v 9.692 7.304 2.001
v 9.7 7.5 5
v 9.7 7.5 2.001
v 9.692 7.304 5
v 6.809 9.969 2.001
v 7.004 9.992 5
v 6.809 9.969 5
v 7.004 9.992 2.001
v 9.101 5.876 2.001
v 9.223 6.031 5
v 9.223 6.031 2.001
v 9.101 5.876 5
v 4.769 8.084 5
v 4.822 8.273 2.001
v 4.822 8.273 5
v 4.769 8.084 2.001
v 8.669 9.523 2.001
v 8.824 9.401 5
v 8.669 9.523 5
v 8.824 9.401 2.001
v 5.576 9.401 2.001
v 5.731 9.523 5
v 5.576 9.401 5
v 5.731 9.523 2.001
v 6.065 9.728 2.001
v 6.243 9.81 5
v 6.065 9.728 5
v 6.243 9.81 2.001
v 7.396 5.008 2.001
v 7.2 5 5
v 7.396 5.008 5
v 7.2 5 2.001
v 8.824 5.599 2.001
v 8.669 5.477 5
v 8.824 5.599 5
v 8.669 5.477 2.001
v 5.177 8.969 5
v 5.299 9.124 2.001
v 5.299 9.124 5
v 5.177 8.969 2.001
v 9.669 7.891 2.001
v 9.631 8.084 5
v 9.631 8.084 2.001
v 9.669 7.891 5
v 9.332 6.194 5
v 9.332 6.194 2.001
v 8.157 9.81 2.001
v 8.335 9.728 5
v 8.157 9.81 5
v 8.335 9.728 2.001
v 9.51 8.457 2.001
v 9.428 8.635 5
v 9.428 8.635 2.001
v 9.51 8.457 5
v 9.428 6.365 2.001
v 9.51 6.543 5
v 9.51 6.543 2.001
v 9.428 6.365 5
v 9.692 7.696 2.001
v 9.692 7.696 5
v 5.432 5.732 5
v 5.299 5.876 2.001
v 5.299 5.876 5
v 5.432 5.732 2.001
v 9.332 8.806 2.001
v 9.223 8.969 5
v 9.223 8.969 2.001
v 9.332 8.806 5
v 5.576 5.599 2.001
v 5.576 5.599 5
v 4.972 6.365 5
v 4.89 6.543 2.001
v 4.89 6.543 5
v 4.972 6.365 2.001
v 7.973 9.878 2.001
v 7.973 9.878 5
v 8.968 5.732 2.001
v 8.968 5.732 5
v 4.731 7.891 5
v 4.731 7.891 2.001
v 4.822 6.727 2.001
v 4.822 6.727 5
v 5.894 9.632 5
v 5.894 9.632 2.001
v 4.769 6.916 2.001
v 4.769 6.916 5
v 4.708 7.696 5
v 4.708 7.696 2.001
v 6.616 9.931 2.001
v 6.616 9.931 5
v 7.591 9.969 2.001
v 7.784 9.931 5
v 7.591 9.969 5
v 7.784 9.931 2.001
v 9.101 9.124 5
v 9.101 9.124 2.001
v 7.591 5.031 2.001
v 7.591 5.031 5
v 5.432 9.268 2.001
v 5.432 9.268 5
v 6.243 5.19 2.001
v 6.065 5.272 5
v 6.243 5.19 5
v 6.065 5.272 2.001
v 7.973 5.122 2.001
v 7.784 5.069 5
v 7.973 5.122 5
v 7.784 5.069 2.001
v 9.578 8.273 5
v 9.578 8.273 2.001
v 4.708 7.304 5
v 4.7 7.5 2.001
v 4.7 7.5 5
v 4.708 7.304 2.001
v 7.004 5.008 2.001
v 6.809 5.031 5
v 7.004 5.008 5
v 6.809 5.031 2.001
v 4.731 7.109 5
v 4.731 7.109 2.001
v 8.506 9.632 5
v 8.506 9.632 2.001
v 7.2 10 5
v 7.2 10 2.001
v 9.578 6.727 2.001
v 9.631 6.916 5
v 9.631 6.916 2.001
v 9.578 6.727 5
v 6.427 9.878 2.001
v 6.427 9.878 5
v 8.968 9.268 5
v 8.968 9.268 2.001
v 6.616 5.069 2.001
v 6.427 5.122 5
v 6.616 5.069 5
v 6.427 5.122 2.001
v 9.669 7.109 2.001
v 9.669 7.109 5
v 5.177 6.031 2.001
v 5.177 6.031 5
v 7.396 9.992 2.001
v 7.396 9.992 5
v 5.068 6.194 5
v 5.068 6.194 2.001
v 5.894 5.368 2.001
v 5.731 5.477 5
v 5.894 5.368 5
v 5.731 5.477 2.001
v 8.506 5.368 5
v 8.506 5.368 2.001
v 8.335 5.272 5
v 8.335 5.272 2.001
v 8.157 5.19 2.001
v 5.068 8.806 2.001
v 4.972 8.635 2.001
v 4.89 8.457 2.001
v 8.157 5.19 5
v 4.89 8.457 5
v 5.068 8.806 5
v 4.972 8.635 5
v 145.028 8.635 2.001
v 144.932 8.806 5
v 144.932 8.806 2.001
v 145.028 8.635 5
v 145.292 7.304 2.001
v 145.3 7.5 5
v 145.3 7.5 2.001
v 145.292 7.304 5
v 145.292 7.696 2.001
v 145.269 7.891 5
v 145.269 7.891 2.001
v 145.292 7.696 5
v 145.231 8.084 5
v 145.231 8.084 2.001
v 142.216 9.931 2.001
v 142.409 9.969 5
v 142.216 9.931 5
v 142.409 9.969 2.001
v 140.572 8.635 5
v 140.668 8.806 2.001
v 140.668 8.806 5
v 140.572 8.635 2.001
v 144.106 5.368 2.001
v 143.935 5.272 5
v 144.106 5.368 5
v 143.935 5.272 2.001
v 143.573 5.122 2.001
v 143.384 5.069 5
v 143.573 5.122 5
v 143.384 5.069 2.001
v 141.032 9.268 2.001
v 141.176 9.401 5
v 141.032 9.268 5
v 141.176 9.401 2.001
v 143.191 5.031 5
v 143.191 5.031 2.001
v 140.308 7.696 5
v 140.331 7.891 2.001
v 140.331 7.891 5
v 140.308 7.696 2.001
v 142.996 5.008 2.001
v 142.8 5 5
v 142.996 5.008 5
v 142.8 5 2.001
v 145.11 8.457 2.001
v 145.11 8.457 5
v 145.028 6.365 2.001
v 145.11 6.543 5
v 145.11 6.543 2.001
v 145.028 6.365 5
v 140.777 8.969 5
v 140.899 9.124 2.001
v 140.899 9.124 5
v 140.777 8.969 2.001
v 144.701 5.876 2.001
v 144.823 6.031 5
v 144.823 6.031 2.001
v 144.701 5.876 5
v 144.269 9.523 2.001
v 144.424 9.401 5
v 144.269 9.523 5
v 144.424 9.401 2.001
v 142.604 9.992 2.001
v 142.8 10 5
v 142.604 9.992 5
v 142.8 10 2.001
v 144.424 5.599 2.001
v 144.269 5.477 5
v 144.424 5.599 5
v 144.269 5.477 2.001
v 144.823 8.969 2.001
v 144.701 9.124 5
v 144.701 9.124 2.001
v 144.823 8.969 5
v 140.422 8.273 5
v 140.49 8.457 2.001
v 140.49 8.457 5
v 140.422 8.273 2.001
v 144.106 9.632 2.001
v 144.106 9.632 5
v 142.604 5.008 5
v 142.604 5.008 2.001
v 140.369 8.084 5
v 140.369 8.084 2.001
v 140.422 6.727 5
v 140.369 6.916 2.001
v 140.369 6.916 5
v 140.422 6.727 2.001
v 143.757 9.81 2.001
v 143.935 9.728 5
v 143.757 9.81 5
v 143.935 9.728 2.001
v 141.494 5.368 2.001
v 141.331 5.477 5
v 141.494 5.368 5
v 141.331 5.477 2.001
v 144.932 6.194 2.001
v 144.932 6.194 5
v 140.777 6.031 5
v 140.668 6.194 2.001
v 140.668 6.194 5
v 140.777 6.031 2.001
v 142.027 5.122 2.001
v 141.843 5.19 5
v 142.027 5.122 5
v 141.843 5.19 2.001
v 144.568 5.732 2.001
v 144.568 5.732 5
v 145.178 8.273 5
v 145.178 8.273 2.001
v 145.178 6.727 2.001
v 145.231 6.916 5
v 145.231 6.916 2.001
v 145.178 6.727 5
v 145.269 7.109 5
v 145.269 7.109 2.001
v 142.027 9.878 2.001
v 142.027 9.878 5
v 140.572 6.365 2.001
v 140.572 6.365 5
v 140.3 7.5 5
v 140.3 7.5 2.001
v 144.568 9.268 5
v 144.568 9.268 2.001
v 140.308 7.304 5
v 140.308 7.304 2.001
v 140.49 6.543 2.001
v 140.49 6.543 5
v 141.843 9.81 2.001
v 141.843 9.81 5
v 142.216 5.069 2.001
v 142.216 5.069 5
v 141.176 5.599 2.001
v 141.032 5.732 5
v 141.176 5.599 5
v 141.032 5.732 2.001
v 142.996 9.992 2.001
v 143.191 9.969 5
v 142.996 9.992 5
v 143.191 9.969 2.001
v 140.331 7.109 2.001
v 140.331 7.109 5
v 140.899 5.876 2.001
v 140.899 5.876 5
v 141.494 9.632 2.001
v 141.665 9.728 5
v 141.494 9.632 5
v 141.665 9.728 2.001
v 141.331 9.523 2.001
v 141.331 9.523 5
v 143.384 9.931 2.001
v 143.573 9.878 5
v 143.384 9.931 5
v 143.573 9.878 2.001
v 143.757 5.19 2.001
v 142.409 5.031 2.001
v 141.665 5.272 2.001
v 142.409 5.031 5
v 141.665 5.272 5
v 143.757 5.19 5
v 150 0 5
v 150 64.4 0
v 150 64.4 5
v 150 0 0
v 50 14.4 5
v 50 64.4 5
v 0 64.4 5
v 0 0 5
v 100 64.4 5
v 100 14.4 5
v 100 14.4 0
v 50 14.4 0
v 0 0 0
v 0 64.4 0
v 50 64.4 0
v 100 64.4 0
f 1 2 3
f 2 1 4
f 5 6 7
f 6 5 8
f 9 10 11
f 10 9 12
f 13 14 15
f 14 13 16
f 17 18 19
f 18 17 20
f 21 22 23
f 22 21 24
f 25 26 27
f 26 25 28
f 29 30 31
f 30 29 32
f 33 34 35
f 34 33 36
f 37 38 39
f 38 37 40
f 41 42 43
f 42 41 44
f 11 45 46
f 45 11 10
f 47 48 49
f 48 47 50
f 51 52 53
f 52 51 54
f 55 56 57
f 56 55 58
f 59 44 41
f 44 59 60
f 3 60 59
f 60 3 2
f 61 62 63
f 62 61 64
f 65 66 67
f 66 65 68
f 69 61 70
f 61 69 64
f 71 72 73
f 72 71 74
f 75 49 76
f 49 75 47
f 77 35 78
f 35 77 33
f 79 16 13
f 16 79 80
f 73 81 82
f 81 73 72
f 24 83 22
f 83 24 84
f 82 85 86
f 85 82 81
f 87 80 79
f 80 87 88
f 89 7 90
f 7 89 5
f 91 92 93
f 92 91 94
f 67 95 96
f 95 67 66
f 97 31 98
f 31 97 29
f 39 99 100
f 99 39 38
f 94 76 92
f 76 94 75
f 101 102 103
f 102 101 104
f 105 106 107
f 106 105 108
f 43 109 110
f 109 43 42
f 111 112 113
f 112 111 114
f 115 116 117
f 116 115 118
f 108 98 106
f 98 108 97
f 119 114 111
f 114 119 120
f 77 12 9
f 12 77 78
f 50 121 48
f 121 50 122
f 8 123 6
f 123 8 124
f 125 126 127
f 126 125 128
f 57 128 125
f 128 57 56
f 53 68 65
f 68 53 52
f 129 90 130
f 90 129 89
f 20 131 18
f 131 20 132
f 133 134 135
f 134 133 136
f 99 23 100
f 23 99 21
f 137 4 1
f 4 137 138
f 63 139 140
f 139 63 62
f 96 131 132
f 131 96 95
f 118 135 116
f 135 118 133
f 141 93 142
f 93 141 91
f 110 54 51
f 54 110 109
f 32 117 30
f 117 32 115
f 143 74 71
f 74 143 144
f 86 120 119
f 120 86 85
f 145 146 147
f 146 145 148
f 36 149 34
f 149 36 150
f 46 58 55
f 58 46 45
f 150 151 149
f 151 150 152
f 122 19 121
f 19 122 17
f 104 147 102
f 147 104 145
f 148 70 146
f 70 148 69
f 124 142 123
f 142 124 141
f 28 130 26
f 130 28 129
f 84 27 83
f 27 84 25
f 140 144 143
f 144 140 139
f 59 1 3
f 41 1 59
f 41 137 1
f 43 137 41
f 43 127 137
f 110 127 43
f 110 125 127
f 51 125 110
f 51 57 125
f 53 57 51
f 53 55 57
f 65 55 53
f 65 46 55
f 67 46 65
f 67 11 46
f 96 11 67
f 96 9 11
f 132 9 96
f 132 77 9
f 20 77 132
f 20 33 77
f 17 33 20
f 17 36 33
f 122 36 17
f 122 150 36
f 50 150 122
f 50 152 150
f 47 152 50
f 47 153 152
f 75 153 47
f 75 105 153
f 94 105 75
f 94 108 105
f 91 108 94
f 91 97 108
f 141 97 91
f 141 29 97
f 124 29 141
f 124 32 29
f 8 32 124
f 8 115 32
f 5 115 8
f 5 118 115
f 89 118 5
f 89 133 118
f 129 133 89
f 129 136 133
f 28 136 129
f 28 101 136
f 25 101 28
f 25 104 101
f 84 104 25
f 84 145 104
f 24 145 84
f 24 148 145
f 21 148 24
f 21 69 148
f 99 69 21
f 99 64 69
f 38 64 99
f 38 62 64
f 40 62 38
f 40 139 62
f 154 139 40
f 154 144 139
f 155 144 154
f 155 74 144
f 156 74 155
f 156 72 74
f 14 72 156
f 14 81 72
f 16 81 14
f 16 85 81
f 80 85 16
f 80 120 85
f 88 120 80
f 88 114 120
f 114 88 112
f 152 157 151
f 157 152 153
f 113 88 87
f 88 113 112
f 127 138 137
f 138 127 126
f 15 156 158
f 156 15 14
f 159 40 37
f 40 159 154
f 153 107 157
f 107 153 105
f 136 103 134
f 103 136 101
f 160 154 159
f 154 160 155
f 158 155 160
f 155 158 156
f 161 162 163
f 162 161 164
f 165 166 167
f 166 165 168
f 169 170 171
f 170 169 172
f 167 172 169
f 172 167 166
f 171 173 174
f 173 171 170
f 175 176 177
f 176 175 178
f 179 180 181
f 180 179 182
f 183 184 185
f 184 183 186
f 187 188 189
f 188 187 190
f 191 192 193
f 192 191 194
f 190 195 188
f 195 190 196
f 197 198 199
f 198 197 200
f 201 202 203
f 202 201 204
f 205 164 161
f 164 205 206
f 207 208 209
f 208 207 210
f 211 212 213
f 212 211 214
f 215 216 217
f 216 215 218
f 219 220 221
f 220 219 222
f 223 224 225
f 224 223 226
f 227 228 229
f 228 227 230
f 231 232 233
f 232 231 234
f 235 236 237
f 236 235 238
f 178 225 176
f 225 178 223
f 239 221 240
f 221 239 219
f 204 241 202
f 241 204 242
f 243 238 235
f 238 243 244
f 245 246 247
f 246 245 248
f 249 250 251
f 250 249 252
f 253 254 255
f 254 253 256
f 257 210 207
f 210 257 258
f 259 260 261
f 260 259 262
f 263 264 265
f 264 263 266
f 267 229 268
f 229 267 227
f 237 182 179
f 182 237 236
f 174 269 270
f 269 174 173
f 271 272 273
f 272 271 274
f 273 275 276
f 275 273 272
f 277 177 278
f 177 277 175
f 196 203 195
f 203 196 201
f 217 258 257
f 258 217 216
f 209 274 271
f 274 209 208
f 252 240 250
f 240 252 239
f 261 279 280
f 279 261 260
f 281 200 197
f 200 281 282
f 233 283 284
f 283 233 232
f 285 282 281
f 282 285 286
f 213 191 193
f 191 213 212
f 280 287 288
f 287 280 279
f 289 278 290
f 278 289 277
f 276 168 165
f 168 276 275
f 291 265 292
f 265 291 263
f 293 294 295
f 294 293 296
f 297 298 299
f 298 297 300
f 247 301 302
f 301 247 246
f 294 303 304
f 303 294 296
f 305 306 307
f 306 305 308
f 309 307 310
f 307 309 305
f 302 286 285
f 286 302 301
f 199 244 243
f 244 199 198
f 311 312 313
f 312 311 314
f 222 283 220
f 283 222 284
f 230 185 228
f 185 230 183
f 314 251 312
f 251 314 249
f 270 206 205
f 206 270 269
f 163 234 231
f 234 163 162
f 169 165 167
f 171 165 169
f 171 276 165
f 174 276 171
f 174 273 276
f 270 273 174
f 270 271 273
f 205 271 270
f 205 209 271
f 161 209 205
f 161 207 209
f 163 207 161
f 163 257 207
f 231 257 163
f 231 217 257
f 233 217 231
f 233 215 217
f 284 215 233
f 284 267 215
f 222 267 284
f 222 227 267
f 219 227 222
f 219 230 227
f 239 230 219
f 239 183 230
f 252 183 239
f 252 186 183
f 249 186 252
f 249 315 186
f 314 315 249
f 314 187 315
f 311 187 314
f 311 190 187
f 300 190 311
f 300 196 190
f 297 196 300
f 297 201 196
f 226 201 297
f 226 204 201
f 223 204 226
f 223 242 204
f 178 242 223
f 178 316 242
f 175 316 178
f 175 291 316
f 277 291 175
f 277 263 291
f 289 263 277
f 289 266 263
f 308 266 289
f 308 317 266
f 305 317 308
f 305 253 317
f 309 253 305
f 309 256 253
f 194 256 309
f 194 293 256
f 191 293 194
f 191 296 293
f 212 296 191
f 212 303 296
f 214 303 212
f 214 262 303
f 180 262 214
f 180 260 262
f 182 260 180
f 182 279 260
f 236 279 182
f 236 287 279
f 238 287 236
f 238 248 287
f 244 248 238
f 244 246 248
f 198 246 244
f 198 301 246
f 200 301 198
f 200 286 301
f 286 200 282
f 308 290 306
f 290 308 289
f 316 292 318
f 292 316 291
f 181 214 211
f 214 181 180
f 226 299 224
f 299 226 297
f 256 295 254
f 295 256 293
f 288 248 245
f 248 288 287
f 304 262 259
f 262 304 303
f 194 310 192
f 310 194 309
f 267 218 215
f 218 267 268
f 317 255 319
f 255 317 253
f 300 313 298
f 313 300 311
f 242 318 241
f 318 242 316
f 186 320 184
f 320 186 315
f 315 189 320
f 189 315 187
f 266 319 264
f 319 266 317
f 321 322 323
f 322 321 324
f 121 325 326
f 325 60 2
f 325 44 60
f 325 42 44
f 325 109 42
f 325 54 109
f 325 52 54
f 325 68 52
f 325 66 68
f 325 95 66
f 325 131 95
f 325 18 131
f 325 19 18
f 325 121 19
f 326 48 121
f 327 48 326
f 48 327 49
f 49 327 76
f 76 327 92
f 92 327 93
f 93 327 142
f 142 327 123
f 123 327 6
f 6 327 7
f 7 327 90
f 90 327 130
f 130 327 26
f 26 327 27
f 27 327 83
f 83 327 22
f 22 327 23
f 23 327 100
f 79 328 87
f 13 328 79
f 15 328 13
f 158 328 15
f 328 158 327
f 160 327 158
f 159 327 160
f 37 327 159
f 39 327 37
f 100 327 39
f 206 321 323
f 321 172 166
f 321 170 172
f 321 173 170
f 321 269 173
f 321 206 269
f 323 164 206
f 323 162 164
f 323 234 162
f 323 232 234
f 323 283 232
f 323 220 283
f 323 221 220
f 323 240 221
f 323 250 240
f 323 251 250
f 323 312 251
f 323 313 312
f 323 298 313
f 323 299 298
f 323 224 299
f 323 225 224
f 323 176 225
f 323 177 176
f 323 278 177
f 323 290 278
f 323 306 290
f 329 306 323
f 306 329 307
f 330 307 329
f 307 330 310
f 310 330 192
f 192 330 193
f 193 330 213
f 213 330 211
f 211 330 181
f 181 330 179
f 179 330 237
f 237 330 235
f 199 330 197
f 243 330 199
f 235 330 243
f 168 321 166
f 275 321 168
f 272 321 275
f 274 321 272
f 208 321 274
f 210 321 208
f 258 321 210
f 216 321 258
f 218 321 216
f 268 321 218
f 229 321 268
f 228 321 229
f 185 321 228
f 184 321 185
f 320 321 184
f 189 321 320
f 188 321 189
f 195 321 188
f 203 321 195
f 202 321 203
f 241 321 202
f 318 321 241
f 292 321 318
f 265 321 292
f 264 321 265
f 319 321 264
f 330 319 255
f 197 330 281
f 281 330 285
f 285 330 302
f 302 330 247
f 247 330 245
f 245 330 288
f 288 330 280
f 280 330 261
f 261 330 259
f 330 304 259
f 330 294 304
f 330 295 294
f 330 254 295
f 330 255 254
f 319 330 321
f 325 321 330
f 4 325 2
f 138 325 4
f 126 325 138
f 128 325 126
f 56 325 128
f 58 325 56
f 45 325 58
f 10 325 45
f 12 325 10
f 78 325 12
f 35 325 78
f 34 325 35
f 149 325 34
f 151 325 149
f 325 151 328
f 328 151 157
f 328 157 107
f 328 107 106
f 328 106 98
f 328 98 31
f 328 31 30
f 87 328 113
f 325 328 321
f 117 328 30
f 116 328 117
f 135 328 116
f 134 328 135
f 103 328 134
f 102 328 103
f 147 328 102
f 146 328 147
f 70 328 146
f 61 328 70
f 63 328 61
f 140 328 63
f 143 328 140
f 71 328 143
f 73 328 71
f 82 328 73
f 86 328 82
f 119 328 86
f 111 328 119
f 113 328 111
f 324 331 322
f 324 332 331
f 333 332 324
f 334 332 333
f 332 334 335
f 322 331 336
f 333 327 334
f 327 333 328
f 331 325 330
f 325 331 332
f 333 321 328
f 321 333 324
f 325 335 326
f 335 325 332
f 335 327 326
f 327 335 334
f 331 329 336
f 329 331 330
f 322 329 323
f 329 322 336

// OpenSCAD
// file: Modules.scad
/*
 * Jig to hold a model airplane while working on it.
 *
 * Vertical sections slide horizonally. Horizontal dimensions are scalable
 * by adding one or more extension bars.
 *
 * Wing supports clamp magnetically. Be sure to glue some felt on the
 * insides of the wing supports to protect the model
 *
 * ©Louis Kowolowski 2020
 */

module tail_holder () {
	translate ([3*bar_w, 0, 10]) {
		rotate ([0, 180, 0]) {
			tail_holder_bottom ();
		}
	}
	// height is +5 (thickness of top) because its been flipped over
	translate ([0, 0, -7]) {
		tail_holder_top ();
	}
}

module tail_holder_bottom () {
	difference () {
		cube ([3*bar_w, 1.5*bar_screw_head_d, bar_w/4]);

		union () {
			// screw/nut hole
			translate ([1.5*bar_w, 1.5*bar_screw_head_d+0.001, bar_w/8]) {
				rotate ([90, 0, 0]) {
					bar_screw ();
				}
			}
			// left magnet hole
			translate ([0.75*bar_screw_head_d, 1.5*bar_screw_d, bar_w/4-magnet_h+0.001]) {
				cylinder (magnet_h, d=magnet_d, $fn=80);
			}
			// right magnet hole
			translate ([(3*bar_w)-(0.75*bar_screw_head_d), 1.5*bar_screw_d, bar_w/4-magnet_h+0.001]) {
				cylinder (magnet_h, d=magnet_d, $fn=80);
			}
		}
	}
	// left side
	translate ([0, 1.5*bar_screw_head_d, 0]) {
		cube ([bar_w, bar_w, 5]);
	}

	// right side
	translate ([2*bar_w, 1.5*bar_screw_head_d, 0]) {
		cube ([bar_w, bar_w, 5]);
	}

}

module tail_holder_top () {

	difference () {
		cube ([3*bar_w, 1.5*bar_screw_head_d, 5]);
		union () {
			// left magnet hole
			translate ([0.75*bar_screw_head_d, 1.5*bar_screw_d, 5.001-magnet_h]) {
				cylinder (magnet_h, d=magnet_d, $fn=80);
			}
			// right magnet hole
			translate ([(3*bar_w)-(0.75*bar_screw_head_d), 1.5*bar_screw_d, 5.001-magnet_h]) {
				cylinder (magnet_h, d=magnet_d, $fn=80);
			}
		}
	}
	// left side
	translate ([0, 1.5*bar_screw_head_d, 0]) {
		cube ([bar_w, bar_w, 5]);
	}

	// right side
	translate ([2*bar_w, 1.5*bar_screw_head_d, 0]) {
		cube ([bar_w, bar_w, 5]);
	}
}

module nose_holder () {
	difference () {
		union () {
			cube ([bar_w, bar_w, 6]);
			translate ([0, 0, 6]) {
				// rear block to house screw/nut holder and magnets for top
				cube ([bar_screw_head_d, bar_w, 1.5*bar_screw_head_d]);
			}
			translate ([0, 0, 6]) {
				// rear block to house screw/nut holder and magnets for top
				cube ([bar_w, bar_w, 1.5*bar_screw_head_d]);
			}
		}
		union () {
			// screw/nut hole
			translate ([bar_screw_head_d+1, bar_w/2, 10]) {
				rotate ([0, 270, 0]) {
					bar_screw ();
				}
			}
			// angled cut to hold nose centered in jib
			translate ([bar_w/2+.5*bar_screw_head_d+0.001, bar_w/2, bar_w/2-5]) {
				rotate ([270, 210, 90]) {
					Triangle(a=bar_w, b=bar_w, angle=120, height=bar_w-bar_screw_head_d+0.001, centerXYZ=[true,true,true]);
				}
			}
			
		}
	}
}


module wing_holder () {
	wing_holder_bottom ();

	translate ([0, 0, 1.5*bar_screw_head_d+2]) {
		wing_holder_top ();
	}
}

module wing_holder_bottom () {
	// slides up and down the riser to hold the wing at the correct height
	difference () {
		union () {
			cube ([bar_w, bar_w, 6]);
			translate ([0, 0, 6]) {
				// rear block to house screw/nut holder and magnets for top
				// add 1 to height for room above the nut
				cube ([bar_screw_head_d, bar_w, bar_screw_head_d+1]);
			}
		}
		union () {
			// screw/nut hole
			translate ([bar_screw_head_d+1, bar_w/2, 11]) {
				rotate ([0, 270, 0]) {
					bar_screw ();
				}
			}
			// magnet mounting holes
			translate ([magnet_d/2+2, magnet_d, bar_screw_head_d+4.001]) {
				rotate ([0, 0, 90]) {
					cylinder (magnet_h, d=magnet_d, $fn=80);
				}
			}
			// magnet mounting holes
			translate ([magnet_d/2+2, bar_w-magnet_d, bar_screw_head_d+4.001]) {
				rotate ([0, 0, 90]) {
					cylinder (magnet_h, d=magnet_d, $fn=80);
				}
			}
		}
	}
}

module wing_holder_top () {
	difference () {
		cube ([bar_w, bar_w, 6]);
		union () {
			// magnet mounting holes
			translate ([bar_w-magnet_d, magnet_d, -1*0.001]) {
				rotate ([0, 0, 90]) {
					cylinder (magnet_h, d=magnet_d, $fn=80);
				}
			}
			// magnet mounting holes
			translate ([bar_w-magnet_d, bar_w-magnet_d, -1*0.001]) {
				rotate ([0, 0, 90]) {
					cylinder (magnet_h, d=magnet_d, $fn=80);
				}
			}
		}
	}
}

module riser () {
	/* vertical bar that will slide forward/backward on the base and hold the
	 * horizontal rest(s) for the model
	 */
	difference () {
		// base
		cube ([riser_w, riser_w, riser_w/4]);	
		union () {
			// slot at bottom for guide on bar
			translate ([riser_w/4, -1*0.001, -1*0.01]) {
				cube ([riser_w/2, riser_w+1, 5.01]);
			}
			// cross slot at bottom for guide on bar
			translate ([-0.001, riser_w/4, -1*0.01]) {
				cube ([riser_w+1, riser_w/2, 5.01]);
			}
			// screw hole
			translate ([riser_w/2, riser_w/2, -1*bar_screw_head_h]) {
				bar_screw ();
			}
		}
	}
	difference () {
		// vartical riser
		translate ([0, 0, riser_w/4]) {
			cube ([riser_w, riser_w/8, riser_l]);
		}
		// screw slot
		translate ([riser_w/2-bar_screw_d/2, -1, riser_w]) {
			cube ([bar_screw_d, riser_w/4+1, riser_l-riser_w]);
		}
	}
}

module bar_screw () {
	// Model of a screw and hex head/nut

	// screw head
	cylinder(bar_screw_head_h, d=bar_screw_head_d, $fn=6);
	translate ([0, 0, 0]) {
		// screw body
		cylinder(bar_screw_h, d=bar_screw_d, $fn=80);
	}
}

module bar () {
	/* lower base unit. Comes together as a cross. Each bar can be extended with
	 * additional bars.
	 * Raised section acts as a guide for the riser. Slot down the middle is for
	 * a clamping butterfly screw.
	 */
	difference () {
		union () {
			cube ([bar_l, bar_w, bar_h]);
			translate ([0, bar_w/4, 0]) {
				// guide slot
				cube ([bar_l, bar_w/2, bar_h+5]);
			}
		}
		translate ([1, bar_w/2-bar_screw_d/2, -0.001]) {
			cube ([bar_l-2, bar_screw_d, bar_screw_h]);
		}
		translate ([1, bar_w/2-bar_screw_head_d/2, -0.001]) {
			 cube ([bar_l, bar_screw_head_d, bar_screw_head_h+1]);
		}
	}
	// upper extension
	difference () {
		translate ([bar_l, 0, bar_h/2]) {
			cube ([bar_w/4, bar_w, bar_h/2]);
		}
		union () {
			// 2 screw holes
			// left
			translate ([bar_l+bar_w/8, bar_w/8, -1*0.001]) {
				bar_screw ();
			}
			// right
			translate ([bar_l+bar_w/8, bar_w-bar_w/8, -1*0.001]) {
				bar_screw ();
			}
		}
	}
	// lower extension
	difference () {
		translate ([-1*bar_w/4, 0, 0]) {
			cube ([bar_w/4, bar_w, bar_h/2]);
		}
		union () {
			// 2 screw holes
			// left
			translate ([-1*bar_w/4+bar_w/8, bar_w/8, -1*0.001]) {
				bar_screw ();
			}
			// right
			translate ([-1*bar_w/4+bar_w/8, bar_w-bar_w/8, -1*0.001]) {
				bar_screw ();
			}
		}
	}

}

module Triangle(
			a, b, angle, height=1, heights=undef,
			center=undef, centerXYZ=[false,false,false]) {
	// Calculate Heights at each point
	heightAB = ((heights==undef) ? height : heights[0])/2;
	heightBC = ((heights==undef) ? height : heights[1])/2;
	heightCA = ((heights==undef) ? height : heights[2])/2;
	centerZ = (center || (center==undef && centerXYZ[2]))?0:max(heightAB,heightBC,heightCA);

	// Calculate Offsets for centering
	offsetX = (center || (center==undef && centerXYZ[0]))?((cos(angle)*a)+b)/3:0;
	offsetY = (center || (center==undef && centerXYZ[1]))?(sin(angle)*a)/3:0;
	
	pointAB1 = [-offsetX,-offsetY, centerZ-heightAB];
	pointAB2 = [-offsetX,-offsetY, centerZ+heightAB];
	pointBC1 = [b-offsetX,-offsetY, centerZ-heightBC];
	pointBC2 = [b-offsetX,-offsetY, centerZ+heightBC];
	pointCA1 = [(cos(angle)*a)-offsetX,(sin(angle)*a)-offsetY, centerZ-heightCA];
	pointCA2 = [(cos(angle)*a)-offsetX,(sin(angle)*a)-offsetY, centerZ+heightCA];

	polyhedron(
		points=[	pointAB1, pointBC1, pointCA1,
					pointAB2, pointBC2, pointCA2 ],
		faces=[	
			[0, 1, 2],
			[3, 5, 4],
			[0, 3, 1],
			[1, 3, 4],
			[1, 4, 2],
			[2, 4, 5],
			[2, 5, 0],
			[0, 5, 3] ] );
}
// file: Globals.scad
/*
 * Global variables used for all the models
 * All units are in mm
 *
 * Jig to hold a model airplane while working on it.
 *
 * Vertical sections slide horizonally. Horizontal dimensions are scalable
 * by adding one or more extension bars.
 *
 * Wing supports clamp magnetically. Be sure to glue some felt on the
 * insides of the wing supports to protect the model
 *
 * ©Louis Kowolowski 2020
 */

/* long dimensions are constrained by the size of the print bed
 */
bar_l = 175;
bar_w = 50;
bar_h = 13;

riser_l = 150;
riser_w = 50;
riser_h = 12;

// M5x20
bar_screw_head_h = 4.8;
bar_screw_head_d = 9.6;
bar_screw_h = 20;
bar_screw_d = 5;

guide_rail_l = bar_l;
guide_rail_w = bar_w/2;
guide_rail_h = 2;

magnet_h = 3;
magnet_d = 5;
// main file
/*
 * Jig to hold a model airplane while working on it.
 *
 * Vertical sections slide horizonally. Horizontal dimensions are scalable
 * by adding one or more extension bars.
 *
 * Wing supports clamp magnetically. Be sure to glue some felt on the
 * insides of the wing supports to protect the model
 *
 * ©Louis Kowolowski 2020
 */

/*
 * Include globals and modules
 */
include <Globals.scad>;
include <Modules.scad>;

tail_holder_top ();
